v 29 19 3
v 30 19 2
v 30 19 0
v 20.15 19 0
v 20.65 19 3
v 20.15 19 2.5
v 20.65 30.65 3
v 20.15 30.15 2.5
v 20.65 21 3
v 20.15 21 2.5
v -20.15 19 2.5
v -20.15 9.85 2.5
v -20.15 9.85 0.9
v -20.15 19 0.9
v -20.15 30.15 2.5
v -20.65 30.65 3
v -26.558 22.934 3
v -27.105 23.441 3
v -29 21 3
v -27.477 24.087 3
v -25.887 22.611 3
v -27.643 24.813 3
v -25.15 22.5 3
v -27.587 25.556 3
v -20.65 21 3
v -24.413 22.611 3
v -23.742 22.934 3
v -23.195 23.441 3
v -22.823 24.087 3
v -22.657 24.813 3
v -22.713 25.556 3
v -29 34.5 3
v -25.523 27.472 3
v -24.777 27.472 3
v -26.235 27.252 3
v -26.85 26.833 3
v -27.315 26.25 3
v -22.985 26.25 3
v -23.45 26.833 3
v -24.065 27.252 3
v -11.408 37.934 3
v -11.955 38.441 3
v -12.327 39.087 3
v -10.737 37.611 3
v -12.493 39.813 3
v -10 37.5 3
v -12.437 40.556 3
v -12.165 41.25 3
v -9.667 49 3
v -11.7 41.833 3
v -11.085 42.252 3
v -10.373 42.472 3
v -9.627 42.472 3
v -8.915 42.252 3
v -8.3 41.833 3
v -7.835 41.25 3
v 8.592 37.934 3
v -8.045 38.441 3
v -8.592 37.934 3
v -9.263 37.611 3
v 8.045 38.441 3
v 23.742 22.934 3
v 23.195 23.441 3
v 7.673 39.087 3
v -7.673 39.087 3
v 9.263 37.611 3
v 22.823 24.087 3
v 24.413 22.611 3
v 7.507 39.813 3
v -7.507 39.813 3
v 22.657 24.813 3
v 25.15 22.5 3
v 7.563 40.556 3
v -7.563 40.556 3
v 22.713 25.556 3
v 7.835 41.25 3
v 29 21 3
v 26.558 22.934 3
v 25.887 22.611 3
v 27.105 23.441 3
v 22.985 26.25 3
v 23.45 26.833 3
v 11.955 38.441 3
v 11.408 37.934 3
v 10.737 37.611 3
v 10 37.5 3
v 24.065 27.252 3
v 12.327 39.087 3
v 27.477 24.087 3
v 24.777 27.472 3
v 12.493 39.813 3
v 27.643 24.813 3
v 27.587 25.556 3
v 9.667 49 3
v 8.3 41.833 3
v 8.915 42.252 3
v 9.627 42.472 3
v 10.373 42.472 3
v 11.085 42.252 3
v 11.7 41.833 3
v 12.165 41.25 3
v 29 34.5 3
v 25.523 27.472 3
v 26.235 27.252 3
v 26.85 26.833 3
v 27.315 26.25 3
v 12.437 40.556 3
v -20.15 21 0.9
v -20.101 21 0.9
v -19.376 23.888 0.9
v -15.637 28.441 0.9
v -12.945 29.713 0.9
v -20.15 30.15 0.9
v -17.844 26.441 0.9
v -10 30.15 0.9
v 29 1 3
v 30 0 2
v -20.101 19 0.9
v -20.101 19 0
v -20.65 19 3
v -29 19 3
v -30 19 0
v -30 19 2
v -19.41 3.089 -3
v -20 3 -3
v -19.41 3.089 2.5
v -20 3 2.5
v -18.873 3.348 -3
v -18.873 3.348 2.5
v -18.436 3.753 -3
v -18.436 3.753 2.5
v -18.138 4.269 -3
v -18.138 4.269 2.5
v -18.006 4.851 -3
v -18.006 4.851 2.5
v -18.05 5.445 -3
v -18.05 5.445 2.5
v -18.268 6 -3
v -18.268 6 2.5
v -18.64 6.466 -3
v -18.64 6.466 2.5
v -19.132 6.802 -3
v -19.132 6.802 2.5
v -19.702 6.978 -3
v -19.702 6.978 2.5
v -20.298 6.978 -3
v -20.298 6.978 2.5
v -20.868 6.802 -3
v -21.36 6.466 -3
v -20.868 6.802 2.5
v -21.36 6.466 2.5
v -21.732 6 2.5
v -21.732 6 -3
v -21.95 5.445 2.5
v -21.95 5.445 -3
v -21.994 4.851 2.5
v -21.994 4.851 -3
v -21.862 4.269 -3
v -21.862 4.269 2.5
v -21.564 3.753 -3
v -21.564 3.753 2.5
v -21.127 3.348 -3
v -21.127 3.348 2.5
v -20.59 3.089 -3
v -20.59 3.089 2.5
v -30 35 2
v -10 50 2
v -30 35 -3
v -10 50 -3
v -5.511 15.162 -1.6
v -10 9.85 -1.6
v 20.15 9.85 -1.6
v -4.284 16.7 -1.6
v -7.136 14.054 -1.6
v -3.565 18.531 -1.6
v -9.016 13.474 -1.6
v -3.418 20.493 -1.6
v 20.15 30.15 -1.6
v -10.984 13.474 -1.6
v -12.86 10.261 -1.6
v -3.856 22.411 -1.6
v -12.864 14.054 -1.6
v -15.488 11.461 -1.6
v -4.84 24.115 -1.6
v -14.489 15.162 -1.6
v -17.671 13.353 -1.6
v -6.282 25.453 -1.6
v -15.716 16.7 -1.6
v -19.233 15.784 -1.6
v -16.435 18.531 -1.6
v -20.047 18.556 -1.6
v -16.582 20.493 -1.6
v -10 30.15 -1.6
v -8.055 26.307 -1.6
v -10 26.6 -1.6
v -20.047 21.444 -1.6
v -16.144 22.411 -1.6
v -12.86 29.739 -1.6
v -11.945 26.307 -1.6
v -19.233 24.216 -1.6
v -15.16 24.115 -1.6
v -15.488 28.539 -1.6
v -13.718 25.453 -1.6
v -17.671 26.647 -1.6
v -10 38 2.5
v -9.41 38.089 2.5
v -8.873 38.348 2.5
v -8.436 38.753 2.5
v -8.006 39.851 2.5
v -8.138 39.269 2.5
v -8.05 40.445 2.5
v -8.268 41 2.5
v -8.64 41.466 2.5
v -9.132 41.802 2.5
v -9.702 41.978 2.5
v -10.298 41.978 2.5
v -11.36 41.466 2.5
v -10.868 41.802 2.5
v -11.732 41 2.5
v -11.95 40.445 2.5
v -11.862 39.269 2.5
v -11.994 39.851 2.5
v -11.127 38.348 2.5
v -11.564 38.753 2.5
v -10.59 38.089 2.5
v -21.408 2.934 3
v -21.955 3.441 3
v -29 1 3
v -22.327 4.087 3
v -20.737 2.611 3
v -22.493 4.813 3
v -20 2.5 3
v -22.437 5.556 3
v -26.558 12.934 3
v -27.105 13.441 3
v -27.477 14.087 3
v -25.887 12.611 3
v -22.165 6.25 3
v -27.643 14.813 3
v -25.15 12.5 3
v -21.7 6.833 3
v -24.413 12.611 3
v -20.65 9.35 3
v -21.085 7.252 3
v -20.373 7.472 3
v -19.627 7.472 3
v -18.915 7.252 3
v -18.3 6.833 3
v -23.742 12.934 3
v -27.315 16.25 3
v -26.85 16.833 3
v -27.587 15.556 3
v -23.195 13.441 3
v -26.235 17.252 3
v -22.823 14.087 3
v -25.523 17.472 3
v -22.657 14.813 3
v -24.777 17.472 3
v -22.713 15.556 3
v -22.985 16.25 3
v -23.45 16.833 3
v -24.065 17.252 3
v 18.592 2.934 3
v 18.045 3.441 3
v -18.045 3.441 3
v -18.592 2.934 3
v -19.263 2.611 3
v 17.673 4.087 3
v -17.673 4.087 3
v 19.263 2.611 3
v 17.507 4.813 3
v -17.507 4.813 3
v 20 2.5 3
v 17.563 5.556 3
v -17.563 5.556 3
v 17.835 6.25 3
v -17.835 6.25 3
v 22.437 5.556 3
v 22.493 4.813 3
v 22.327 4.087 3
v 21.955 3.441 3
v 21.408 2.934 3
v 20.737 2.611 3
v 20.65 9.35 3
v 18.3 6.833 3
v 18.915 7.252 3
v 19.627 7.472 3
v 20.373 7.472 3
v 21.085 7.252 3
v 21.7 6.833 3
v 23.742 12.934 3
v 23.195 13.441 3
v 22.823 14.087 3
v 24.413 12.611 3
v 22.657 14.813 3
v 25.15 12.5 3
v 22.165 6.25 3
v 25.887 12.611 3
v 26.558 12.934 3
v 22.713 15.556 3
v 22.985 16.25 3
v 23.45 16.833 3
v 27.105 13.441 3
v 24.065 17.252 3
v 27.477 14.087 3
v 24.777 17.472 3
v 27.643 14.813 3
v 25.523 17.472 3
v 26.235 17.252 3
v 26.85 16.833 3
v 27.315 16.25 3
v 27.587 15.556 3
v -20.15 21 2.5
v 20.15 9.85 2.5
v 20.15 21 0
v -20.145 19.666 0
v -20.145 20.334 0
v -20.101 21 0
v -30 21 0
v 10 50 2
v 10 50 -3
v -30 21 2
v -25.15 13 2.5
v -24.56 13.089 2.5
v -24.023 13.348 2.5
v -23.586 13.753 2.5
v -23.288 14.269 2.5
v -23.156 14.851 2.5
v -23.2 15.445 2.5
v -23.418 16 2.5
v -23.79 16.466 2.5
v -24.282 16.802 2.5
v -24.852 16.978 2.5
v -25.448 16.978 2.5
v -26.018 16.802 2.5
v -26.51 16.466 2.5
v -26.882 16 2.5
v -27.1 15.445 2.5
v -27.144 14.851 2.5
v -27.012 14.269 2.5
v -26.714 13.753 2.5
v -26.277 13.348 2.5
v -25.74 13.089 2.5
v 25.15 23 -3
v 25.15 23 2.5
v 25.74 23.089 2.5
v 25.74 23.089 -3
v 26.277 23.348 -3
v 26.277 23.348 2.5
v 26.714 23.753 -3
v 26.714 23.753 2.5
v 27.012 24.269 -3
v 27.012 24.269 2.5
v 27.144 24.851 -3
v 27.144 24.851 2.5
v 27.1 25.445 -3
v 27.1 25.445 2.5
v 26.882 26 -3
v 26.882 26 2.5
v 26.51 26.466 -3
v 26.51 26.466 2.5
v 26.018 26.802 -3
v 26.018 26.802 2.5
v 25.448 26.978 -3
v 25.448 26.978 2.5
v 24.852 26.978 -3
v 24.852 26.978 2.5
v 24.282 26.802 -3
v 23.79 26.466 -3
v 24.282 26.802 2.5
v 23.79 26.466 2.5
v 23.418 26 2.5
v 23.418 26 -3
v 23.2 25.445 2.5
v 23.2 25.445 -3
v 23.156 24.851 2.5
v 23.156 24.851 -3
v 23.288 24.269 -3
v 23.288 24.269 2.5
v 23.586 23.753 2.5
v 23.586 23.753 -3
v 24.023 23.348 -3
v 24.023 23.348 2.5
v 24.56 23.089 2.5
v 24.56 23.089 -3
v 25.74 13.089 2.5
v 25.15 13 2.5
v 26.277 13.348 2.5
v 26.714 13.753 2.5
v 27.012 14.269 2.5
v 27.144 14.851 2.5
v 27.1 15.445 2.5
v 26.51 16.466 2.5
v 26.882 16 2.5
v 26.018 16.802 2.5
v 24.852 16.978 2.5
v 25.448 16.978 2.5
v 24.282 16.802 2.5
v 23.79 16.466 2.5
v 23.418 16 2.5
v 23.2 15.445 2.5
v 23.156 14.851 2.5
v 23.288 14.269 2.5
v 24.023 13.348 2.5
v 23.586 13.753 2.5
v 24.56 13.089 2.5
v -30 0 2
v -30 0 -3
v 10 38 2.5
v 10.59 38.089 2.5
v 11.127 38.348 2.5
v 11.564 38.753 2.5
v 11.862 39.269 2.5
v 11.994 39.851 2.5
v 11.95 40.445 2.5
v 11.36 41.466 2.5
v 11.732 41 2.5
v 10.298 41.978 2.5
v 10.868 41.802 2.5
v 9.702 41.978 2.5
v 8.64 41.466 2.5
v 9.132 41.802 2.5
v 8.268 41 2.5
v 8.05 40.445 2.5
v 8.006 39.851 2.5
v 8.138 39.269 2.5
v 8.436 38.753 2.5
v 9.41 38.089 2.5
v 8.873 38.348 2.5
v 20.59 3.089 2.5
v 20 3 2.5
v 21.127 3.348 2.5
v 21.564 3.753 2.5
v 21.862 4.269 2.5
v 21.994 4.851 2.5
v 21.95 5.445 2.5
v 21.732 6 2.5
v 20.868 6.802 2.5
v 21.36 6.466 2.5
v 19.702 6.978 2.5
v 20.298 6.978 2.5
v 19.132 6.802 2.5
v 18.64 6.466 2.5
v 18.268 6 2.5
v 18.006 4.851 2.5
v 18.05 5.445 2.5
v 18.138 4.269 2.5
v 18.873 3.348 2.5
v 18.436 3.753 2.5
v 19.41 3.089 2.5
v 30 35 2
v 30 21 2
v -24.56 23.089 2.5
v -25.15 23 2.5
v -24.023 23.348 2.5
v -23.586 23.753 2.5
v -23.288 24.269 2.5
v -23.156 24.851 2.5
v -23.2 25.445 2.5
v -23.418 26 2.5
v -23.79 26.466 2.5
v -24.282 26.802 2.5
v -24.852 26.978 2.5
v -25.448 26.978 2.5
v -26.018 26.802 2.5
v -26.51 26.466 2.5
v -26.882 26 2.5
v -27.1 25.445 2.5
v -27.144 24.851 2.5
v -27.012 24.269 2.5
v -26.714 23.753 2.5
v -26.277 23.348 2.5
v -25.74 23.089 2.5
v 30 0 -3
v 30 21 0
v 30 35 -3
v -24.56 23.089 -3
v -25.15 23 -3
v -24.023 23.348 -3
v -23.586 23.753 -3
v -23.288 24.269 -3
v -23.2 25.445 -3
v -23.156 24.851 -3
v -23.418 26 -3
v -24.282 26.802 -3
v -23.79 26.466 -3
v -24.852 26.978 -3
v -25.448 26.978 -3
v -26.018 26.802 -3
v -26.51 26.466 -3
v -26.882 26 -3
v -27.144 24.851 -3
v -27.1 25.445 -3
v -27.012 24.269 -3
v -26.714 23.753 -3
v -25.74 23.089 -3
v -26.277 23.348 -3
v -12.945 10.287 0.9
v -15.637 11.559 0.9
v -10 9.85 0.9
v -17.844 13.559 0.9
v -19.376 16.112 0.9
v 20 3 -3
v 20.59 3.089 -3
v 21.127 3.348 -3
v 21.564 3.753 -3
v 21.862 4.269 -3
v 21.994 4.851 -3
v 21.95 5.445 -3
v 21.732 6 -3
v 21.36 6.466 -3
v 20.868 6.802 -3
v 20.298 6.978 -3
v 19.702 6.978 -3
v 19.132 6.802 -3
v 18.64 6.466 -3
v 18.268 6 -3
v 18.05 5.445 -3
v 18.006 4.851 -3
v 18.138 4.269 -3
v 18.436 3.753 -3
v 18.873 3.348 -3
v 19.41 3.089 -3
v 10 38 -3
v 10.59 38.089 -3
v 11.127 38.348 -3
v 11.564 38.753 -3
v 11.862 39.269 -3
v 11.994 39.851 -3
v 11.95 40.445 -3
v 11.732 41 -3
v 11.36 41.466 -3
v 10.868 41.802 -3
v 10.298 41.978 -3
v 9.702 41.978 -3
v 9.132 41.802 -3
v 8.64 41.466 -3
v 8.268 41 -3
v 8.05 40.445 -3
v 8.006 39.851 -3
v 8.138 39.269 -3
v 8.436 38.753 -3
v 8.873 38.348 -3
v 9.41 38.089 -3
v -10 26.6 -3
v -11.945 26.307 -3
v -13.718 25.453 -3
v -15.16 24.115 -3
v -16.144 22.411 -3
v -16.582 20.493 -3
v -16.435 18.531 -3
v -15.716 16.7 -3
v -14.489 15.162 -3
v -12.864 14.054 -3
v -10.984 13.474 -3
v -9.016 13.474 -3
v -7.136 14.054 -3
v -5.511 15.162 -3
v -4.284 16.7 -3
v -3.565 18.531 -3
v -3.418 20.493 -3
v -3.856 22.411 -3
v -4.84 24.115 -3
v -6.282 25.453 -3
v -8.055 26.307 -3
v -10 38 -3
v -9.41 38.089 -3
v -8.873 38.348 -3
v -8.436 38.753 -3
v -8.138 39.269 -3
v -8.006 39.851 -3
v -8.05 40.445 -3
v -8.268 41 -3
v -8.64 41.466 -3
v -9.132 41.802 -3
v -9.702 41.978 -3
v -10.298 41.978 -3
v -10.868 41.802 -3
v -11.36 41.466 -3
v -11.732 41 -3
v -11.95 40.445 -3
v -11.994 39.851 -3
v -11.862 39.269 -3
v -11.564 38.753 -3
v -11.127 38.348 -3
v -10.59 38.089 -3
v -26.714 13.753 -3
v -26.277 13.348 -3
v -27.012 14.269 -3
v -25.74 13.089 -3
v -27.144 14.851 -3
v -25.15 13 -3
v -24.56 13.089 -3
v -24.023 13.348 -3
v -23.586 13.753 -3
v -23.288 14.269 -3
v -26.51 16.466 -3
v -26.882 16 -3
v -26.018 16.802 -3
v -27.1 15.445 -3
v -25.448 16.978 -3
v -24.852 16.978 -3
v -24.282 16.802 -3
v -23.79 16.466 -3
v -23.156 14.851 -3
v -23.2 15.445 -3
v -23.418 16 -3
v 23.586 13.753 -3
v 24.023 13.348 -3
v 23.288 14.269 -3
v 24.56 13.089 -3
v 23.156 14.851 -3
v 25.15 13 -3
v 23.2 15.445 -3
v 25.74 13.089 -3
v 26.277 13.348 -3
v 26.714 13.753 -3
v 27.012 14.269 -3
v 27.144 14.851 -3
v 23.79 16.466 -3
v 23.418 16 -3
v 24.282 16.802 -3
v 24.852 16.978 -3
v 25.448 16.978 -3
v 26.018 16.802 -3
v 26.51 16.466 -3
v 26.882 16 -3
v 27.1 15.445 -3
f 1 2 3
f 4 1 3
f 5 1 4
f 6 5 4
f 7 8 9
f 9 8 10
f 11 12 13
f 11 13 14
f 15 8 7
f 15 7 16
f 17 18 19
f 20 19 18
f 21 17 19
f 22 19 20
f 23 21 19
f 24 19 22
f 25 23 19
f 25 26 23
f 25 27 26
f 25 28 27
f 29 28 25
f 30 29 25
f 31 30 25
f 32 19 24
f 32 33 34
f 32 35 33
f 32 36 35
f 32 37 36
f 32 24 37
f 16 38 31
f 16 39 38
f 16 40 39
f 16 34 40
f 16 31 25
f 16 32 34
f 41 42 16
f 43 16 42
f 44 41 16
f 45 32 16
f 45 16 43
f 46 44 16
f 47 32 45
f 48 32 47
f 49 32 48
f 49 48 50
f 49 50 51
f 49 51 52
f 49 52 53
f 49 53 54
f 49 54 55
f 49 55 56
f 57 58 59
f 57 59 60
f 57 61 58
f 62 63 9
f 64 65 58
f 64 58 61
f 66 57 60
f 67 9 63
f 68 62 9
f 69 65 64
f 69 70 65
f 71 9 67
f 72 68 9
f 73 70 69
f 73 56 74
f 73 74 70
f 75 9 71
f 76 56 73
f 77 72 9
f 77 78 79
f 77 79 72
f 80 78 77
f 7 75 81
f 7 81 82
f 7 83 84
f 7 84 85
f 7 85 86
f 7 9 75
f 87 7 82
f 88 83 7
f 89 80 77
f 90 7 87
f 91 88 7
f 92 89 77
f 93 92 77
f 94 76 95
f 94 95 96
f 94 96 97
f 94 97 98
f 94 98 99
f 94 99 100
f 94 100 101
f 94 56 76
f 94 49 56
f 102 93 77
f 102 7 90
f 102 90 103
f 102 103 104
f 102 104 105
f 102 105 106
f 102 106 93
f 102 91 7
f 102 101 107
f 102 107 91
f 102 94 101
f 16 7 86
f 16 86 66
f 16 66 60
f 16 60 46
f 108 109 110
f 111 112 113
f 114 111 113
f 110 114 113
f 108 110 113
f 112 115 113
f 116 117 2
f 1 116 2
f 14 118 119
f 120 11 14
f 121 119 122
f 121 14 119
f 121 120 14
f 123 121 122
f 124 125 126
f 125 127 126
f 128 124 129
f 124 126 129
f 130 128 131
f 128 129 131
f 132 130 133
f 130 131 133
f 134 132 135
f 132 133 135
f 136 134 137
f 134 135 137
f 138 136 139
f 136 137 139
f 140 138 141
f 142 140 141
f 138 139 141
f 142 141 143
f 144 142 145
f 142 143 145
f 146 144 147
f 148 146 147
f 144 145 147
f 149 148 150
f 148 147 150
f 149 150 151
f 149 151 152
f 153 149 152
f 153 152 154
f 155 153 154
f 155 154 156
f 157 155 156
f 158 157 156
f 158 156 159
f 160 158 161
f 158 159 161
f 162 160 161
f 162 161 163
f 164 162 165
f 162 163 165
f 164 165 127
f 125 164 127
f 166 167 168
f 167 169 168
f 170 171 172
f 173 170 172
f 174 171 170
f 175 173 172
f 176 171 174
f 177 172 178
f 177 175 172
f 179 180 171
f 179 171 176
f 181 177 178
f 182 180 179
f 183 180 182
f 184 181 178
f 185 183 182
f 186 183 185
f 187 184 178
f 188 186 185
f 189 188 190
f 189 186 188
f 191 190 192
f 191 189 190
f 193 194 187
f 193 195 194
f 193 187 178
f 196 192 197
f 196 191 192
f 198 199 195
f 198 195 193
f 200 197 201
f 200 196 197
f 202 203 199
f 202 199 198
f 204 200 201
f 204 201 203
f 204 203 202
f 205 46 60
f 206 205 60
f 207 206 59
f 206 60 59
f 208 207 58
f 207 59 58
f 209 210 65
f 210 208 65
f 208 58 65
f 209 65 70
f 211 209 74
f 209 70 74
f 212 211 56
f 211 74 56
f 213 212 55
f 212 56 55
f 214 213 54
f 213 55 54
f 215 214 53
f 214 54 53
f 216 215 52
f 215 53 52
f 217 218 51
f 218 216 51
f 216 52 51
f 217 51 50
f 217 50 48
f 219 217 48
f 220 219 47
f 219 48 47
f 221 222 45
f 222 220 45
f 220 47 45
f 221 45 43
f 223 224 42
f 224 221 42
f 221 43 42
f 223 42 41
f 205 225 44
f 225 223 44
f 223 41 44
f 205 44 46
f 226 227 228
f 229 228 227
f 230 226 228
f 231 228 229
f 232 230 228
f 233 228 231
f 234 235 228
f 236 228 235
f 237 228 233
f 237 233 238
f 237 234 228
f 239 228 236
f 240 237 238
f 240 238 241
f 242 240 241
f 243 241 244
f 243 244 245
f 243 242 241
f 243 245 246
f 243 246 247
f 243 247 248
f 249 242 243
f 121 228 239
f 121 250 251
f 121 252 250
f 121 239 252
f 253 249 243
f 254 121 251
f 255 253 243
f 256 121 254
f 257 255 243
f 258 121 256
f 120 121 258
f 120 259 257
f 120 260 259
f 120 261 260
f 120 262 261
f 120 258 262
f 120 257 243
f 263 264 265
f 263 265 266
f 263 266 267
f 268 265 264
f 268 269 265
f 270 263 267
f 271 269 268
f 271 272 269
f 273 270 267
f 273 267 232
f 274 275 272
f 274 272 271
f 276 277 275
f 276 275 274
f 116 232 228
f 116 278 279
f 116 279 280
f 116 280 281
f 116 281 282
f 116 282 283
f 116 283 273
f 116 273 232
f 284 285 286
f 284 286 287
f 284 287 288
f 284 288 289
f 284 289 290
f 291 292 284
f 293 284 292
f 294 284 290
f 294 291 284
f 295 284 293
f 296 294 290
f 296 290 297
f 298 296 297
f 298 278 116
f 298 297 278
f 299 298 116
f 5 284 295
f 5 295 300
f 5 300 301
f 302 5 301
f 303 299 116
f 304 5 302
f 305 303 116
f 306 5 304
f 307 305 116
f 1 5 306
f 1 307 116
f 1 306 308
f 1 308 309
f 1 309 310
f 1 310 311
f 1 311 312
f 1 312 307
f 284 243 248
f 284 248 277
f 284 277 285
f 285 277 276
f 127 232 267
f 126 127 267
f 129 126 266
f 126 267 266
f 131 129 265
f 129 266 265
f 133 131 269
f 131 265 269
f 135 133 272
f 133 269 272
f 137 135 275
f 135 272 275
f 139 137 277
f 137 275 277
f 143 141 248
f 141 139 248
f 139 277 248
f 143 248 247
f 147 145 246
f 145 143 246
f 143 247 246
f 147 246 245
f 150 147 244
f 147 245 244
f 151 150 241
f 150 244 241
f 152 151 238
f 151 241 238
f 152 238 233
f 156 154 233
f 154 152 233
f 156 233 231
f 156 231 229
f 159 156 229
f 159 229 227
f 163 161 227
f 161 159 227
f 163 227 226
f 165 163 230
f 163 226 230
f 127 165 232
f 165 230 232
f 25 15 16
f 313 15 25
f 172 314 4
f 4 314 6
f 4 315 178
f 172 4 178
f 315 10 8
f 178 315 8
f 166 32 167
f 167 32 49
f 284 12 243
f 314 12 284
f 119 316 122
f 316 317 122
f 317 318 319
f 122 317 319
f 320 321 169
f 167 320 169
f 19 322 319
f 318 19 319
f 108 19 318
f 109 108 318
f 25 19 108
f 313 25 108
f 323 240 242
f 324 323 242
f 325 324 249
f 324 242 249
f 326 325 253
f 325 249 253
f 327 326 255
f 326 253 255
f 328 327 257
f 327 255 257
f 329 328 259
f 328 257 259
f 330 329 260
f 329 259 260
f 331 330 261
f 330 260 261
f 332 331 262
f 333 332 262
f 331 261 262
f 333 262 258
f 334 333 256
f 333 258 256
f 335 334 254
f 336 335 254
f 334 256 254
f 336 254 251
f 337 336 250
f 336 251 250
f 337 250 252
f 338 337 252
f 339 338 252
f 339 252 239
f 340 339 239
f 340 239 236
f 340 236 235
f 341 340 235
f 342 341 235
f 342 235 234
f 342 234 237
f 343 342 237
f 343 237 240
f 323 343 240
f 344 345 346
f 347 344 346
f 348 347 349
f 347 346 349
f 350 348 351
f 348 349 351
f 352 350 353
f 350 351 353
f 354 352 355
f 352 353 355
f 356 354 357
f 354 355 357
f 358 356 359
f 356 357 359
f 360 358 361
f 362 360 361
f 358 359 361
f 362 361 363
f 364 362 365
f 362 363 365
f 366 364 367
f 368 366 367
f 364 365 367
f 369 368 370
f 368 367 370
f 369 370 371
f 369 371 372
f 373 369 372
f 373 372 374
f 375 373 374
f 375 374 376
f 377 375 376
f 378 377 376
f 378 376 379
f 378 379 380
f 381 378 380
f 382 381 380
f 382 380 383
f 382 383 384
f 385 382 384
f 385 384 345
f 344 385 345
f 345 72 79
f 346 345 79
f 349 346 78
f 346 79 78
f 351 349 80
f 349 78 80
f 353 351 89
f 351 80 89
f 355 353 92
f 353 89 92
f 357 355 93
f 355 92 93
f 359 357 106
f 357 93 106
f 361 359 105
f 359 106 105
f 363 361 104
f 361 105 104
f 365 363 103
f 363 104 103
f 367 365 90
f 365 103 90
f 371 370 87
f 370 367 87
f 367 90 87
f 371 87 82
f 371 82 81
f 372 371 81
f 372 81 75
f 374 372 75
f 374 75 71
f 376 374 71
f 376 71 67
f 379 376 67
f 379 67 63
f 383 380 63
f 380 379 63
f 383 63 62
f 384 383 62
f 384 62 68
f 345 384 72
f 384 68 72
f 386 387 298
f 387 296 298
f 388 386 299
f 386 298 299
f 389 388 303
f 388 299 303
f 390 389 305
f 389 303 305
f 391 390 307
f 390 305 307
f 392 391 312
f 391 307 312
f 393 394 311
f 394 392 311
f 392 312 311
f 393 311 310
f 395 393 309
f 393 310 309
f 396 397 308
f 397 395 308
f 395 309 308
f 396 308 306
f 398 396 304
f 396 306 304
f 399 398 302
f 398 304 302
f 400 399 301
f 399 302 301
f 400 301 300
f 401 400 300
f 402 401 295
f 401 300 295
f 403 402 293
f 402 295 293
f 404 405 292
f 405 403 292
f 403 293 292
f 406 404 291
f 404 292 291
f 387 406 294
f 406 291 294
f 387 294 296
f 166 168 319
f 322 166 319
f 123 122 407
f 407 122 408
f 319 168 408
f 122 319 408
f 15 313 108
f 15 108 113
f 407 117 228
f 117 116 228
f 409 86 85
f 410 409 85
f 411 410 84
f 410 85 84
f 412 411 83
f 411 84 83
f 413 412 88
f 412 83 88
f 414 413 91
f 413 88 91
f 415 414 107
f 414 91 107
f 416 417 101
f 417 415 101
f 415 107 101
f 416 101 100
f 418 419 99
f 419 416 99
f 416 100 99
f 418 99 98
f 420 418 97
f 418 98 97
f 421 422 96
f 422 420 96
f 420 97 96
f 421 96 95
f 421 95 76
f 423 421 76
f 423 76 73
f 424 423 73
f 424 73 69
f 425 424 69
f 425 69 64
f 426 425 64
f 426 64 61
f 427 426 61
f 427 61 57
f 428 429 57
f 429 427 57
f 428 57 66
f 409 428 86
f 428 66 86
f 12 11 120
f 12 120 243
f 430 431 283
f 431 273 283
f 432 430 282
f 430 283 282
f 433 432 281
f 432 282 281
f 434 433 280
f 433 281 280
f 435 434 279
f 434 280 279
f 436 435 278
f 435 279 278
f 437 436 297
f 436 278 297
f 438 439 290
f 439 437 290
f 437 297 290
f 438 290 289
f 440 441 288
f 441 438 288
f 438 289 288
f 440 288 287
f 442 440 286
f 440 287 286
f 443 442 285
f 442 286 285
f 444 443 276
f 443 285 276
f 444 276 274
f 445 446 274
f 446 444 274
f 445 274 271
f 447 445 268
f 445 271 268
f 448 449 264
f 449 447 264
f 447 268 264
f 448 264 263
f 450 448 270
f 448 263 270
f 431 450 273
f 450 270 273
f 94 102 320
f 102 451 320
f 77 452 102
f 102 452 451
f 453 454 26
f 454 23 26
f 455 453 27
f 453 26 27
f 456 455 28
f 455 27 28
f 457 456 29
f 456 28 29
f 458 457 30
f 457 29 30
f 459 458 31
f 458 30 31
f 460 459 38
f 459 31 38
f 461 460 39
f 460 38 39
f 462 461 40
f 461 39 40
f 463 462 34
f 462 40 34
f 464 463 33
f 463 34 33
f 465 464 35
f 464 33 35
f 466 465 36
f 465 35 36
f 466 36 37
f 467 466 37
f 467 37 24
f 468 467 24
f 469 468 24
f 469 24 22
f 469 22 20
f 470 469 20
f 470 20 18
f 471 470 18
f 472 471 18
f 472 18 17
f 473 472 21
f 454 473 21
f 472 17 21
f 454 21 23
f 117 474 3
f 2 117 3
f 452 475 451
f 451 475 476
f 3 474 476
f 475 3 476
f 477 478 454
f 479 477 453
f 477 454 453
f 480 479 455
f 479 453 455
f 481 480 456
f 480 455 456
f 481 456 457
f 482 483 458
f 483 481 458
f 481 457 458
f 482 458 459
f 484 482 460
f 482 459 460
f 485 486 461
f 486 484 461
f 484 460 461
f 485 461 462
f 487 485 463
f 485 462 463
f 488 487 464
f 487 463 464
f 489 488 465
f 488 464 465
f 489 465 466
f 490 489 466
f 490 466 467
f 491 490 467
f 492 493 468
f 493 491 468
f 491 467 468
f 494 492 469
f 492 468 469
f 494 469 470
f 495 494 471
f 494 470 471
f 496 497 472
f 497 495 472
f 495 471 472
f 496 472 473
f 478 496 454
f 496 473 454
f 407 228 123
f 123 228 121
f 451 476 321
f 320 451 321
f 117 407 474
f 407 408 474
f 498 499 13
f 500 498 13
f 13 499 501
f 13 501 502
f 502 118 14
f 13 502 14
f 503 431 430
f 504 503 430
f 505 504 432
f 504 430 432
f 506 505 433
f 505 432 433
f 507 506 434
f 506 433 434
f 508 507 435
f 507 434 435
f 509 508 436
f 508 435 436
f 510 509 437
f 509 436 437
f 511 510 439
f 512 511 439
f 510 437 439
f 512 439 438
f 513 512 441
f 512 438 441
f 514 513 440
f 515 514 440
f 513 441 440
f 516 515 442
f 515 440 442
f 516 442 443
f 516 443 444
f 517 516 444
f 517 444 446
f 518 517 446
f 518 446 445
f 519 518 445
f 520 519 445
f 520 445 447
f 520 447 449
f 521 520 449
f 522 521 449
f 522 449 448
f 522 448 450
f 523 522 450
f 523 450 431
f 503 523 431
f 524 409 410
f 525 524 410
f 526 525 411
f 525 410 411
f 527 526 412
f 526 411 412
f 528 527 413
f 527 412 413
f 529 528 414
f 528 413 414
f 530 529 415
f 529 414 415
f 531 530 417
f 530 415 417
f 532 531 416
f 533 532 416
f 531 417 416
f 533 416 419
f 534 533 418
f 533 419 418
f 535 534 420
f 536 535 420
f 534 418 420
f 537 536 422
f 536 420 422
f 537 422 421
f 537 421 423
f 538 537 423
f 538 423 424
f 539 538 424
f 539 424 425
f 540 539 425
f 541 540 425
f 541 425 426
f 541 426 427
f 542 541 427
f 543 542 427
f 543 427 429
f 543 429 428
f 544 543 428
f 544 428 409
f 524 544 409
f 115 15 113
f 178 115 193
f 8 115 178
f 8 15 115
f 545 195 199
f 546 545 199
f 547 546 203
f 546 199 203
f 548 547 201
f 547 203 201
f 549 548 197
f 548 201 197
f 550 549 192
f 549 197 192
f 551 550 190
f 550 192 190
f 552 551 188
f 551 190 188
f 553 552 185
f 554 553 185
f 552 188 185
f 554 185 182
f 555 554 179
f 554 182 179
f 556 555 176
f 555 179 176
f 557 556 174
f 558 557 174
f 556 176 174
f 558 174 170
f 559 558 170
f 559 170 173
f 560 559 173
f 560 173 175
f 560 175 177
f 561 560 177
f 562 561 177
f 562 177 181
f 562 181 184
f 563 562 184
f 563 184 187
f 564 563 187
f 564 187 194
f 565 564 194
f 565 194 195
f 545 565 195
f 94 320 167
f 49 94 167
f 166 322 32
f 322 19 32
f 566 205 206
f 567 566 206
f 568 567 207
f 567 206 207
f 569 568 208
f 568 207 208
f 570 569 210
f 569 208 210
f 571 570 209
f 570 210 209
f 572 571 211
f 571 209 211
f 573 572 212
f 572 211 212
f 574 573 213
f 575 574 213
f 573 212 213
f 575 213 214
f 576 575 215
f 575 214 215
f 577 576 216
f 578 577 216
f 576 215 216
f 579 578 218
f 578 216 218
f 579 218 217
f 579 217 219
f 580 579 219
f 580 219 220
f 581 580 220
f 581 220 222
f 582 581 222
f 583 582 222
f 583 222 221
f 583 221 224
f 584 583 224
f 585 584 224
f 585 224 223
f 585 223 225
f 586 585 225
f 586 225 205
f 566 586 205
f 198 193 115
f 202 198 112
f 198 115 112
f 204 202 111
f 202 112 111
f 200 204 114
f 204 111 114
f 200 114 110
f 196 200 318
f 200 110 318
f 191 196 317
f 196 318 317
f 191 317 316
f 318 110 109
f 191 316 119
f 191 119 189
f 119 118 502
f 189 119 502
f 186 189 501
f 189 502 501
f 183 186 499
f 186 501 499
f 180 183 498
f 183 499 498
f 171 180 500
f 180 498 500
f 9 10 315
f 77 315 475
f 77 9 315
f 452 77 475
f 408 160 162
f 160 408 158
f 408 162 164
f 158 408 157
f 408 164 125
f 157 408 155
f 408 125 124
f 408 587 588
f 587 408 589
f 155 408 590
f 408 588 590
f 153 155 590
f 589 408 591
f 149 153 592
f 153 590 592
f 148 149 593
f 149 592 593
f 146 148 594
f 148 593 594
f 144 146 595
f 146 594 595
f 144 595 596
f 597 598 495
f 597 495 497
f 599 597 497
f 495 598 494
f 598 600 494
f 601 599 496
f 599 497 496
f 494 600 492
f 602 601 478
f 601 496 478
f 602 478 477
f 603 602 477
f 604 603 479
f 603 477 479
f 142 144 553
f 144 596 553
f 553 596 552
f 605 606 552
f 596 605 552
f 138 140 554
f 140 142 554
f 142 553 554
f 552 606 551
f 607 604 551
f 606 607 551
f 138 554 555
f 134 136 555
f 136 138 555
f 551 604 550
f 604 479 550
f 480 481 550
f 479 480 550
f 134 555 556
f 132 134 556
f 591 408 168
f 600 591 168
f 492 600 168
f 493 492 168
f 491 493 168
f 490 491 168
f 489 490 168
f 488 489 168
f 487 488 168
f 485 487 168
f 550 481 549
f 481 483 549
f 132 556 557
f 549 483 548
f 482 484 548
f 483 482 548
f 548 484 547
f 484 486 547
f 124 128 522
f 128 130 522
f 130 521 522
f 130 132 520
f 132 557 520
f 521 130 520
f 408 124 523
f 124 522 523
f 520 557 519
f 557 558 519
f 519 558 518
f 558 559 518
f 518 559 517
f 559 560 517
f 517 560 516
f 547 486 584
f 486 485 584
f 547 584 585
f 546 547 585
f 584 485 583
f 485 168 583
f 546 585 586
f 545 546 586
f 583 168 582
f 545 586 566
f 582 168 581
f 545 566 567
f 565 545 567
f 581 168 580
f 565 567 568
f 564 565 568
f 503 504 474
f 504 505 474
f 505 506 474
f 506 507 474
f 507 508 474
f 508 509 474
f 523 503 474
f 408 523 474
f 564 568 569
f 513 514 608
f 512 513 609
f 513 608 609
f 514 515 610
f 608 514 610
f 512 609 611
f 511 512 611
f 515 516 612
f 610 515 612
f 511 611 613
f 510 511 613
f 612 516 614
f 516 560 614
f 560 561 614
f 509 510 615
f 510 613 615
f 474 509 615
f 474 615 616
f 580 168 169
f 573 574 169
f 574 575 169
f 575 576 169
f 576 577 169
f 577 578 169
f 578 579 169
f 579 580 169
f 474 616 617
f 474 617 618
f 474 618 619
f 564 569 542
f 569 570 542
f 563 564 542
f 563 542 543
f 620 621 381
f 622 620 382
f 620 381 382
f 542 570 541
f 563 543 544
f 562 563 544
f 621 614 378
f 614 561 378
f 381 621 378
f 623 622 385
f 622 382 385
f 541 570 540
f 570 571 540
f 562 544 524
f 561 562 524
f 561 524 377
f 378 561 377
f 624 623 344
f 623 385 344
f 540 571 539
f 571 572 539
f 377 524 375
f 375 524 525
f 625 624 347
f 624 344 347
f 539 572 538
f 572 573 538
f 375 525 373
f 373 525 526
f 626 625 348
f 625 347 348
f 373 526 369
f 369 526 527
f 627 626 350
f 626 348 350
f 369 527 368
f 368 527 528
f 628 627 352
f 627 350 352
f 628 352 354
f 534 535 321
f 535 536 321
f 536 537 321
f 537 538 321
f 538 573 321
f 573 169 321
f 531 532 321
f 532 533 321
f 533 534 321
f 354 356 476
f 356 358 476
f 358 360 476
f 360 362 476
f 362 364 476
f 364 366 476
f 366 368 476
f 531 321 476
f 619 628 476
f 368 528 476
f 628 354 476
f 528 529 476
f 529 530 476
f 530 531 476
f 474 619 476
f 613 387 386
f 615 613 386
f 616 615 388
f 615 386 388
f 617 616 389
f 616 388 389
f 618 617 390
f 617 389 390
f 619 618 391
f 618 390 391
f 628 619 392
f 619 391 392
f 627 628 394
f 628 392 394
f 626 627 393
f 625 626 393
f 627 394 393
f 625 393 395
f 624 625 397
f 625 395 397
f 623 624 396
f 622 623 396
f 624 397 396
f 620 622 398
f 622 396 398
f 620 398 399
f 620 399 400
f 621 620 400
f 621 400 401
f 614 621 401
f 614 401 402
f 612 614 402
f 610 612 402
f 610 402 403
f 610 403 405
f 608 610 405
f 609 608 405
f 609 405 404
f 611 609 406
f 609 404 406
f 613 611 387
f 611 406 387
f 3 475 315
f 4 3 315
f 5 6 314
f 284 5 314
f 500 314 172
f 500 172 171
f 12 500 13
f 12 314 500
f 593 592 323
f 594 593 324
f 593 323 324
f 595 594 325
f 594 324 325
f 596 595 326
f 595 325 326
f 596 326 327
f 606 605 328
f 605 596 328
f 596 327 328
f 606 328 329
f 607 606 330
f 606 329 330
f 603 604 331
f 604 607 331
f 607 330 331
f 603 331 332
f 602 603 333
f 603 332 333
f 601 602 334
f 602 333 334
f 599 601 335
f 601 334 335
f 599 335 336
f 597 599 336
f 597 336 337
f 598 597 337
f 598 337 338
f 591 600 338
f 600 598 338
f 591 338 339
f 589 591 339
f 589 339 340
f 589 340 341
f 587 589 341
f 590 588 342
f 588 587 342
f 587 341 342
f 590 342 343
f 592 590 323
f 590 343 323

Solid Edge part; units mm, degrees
sketch "Sketch1" plane through (0, 0, 0) normal (0, 0, 1) x (1, 0, 0)
  line L0 (-30, 35) -> (-30, 0)
  line L1 (-30, 0) -> (30, 0)
  line L2 (30, 0) -> (30, 35)
  line L3 (30, 35) -> (10, 50)
  line L4 (10, 50) -> (-10, 50)
  line L5 (-10, 50) -> (-30, 35)
  dimension "D1" = 50
  dimension "D2" = 35
  dimension "D3" = 60
  dimension "D4" = 10
extrude "Protrusion1" add sketch "Sketch1" along normal mid plane 6
chamfer "Chamfer_1" distance 1 angle 45 6 edges at (-30, 17.5, 3) (0, 0, 3) (-20, 42.5, 3) (0, 50, 3) (20, 42.5, 3) (30, 17.5, 3)
hole "Hole_1" at (10, 40, 3) direction (0, 0, -1) diameter 4 end up to next
hole "Hole1" at (-10, 40, 3) direction (0, 0, -1) diameter 4 end up to next
hole "Hole2" at (20, 5, 3) direction (0, 0, -1) diameter 4 end up to next
hole "Hole3" at (-20, 5, 3) direction (0, 0, -1) diameter 4 end up to next
sketch "Sketch2" plane through (-10, 0, 0) normal (1, 0, 0) x (0, 1, 0)
  line L0 (30.15, 3) -> (20, 3)
  line L1 (30.15, -1.6) -> (30.15, 3)
  line L2 (26.6, -1.6) -> (30.15, -1.6)
  line L3 (26.6, -3) -> (26.6, -1.6)
  line L4 (20, -3) -> (26.6, -3)
  dimension "D1" = 20
  dimension "D2" = 1.4
revolve "RevolvedCutout1" cut sketch "Sketch2" angle 360 about axis through (-10, 20, -3) along (0, 0, 1)
sketch "Sketch3" plane through (0, 25, 3) normal (0, 0, 1) x (1, 0, 0)
  line L0 (-10, -15.15) -> (20.15, -15.15)
  line L1 (20.15, -15.15) -> (20.15, 5.15)
  line L2 (20.15, 5.15) -> (-10, 5.15)
  line L3 (-10, 5.15) -> (-10, -15.15)
  dimension "D1" = 30.15
extrude "Cutout1" cut sketch "Sketch3" against normal up to vertex (4.6 mm away)
sketch "Sketch4" plane through (0, 25, 3) normal (0, 0, 1) x (1, 0, 0)
  line L0 (0.15, -15.15) -> (-20.15, -15.15)
  line L1 (-20.15, -15.15) -> (-20.15, 5.15)
  line L2 (-20.15, 5.15) -> (0.15, 5.15)
  line L3 (0.15, 5.15) -> (0.15, -15.15)
extrude "Cutout2" cut sketch "Sketch4" against normal blind 2.1
hole "Hole_5" at (25.15, 25, 3) direction (0, 0, -1) diameter 4 end up to next
hole "Hole4" at (25.15, 15, 3) direction (0, 0, -1) diameter 4 end up to next
chamfer "Chamfer_2" distance 0.5 angle 45 10 edges at (-10, 42, 3) (10, 42, 3) (25.15, 27, 3) (25.15, 17, 3) (20, 7, 3) (-20, 7, 3) (0, 30.15, 3) (20.15, 20, 3) (0, 9.85, 3) (-20.15, 20, 3)
sketch "Sketch5" plane through (0, 25, 3) normal (0, 0, 1) x (1, 0, 0)
  line L0 (20.15, -4) -> (30, -4)
  line L1 (30, -4) -> (30, -6)
  line L2 (30, -6) -> (20.15, -6)
  line L3 (20.15, -6) -> (20.15, -4)
  dimension "D1" = 2
extrude "ExtrudedCutout_3" cut sketch "Sketch5" against normal blind 3
mirror "Mirror1" about plane through (0, 0, 0) normal (1, 0, 0) of "Hole_5", "Hole4", "ExtrudedCutout_3"
chamfer "Chamfer1" distance 0.5 angle 45 2 edges at (-25.15, 27, 3) (-25.15, 17, 3)
sketch "Sketch6" plane through (0, 25, 3) normal (0, 0, 1) x (1, 0, 0)
  line L0 (-30, -6) -> (-30, -4)
  line L1 (-30, -4) -> (-18, -4)
  line L2 (-18, -4) -> (-18, -6)
  line L3 (-18, -6) -> (-30, -6)
  dimension "D1" = 2
  dimension "D2" = 12
extrude "ExtrudedCutout_5" cut sketch "Sketch6" against normal blind 3
properties material "Polyethylene, low density"
